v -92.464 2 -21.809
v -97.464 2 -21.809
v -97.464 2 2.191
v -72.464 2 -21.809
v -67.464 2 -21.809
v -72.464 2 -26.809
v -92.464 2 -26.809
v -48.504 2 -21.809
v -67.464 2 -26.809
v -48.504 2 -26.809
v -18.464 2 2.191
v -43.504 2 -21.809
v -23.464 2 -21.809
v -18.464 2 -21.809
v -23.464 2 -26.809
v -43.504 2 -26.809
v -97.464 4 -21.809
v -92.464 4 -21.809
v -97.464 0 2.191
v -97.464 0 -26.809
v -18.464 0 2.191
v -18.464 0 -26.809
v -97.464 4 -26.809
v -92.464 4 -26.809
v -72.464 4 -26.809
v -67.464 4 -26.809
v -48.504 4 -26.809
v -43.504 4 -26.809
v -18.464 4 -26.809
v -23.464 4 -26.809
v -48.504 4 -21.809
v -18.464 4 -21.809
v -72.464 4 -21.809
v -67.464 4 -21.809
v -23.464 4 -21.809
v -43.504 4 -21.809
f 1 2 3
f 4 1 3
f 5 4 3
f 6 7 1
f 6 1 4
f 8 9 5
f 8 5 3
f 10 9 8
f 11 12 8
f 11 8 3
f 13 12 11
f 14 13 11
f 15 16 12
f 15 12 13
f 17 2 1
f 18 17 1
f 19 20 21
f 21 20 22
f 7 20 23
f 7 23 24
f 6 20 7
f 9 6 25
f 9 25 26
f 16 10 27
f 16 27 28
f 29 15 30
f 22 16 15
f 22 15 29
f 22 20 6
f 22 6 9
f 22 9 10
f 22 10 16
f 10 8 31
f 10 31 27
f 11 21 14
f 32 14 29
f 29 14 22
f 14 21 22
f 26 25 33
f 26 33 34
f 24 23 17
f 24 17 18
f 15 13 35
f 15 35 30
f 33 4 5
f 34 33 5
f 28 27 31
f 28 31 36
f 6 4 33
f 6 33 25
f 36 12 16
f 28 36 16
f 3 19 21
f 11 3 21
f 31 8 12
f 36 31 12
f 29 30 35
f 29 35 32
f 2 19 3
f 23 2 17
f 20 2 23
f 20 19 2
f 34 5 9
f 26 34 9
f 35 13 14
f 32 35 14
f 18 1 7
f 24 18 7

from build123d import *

# Parameters (mm, degrees)
SKETCH_1_W      = 79
SKETCH_1_H      = 29
EXTRUDE_1_DEPTH = 2
SKETCH_2_W      = 5
SKETCH_2_H      = 5
EXTRUDE_3_DEPTH = 4
SKETCH_3_W      = 5
SKETCH_3_H      = 5
EXTRUDE_4_DEPTH = 4


with BuildPart() as part:
    # 草图1 → 凸台-拉伸1 (new body)
    with BuildSketch(Plane(origin=(0, 0, 0), x_dir=(1, 0, 0), z_dir=(0, 1, 0))):
        with Locations((-57.963659684, 12.309109642)):
            Rectangle(SKETCH_1_W, SKETCH_1_H)
    extrude(amount=EXTRUDE_1_DEPTH)

    # 草图2 → 凸台-拉伸3 (add)
    with BuildSketch(Plane(origin=(0, 0, 0), x_dir=(1, 0, 0), z_dir=(0, 1, 0))):
        with Locations((-94.963659684, 24.309109642)):
            Rectangle(SKETCH_2_W, SKETCH_2_H)
        with Locations((-20.963659684, 24.309109642)):
            Rectangle(SKETCH_2_W, SKETCH_2_H)
    extrude(amount=EXTRUDE_3_DEPTH)

    # 草图3 → 凸台-拉伸4 (add)
    with BuildSketch(Plane(origin=(0, 0, 0), x_dir=(1, 0, 0), z_dir=(0, 1, 0))):
        with Locations((-69.963659684, 24.309109642)):
            Rectangle(SKETCH_3_W, SKETCH_3_H)
        with Locations((-46.003915764, 24.309109642)):
            Rectangle(SKETCH_3_W, SKETCH_3_H)
    extrude(amount=EXTRUDE_4_DEPTH)


solid = part.part
